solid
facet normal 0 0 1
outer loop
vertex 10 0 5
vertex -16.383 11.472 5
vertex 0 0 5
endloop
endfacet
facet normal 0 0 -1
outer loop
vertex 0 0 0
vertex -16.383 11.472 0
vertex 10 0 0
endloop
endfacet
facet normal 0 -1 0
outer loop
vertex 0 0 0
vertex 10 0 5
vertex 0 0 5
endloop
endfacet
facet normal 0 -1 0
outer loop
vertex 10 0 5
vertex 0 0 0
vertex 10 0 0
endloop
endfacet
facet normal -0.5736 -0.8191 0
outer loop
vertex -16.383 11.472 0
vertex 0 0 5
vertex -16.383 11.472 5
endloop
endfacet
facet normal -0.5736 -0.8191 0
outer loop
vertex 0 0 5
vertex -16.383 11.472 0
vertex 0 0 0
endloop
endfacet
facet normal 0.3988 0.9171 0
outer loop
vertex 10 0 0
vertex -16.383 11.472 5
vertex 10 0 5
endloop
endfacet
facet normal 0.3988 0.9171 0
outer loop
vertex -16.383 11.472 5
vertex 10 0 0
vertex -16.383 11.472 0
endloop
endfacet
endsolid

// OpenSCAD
// Title: Wedge Triangle Module
// Author: Carlo Wood
// Date: 19/8/2016
// License: Creative Commons - Share Alike - Attribution

// Usage: Include in your other .scad projects and call wedge with arguments for the height
//        of the wedge, two of the legs of the wedge, and the angle between those legs.
//        The resulting wedge will be placed with the point at the origin, `leg1' along the x-axis
//        and extending `height' into the z axis, with the angle starting at the x axis and
//        extending counter-clockwise as per the right-hand rule towards `leg2`.


//           Y-axis
//           |
//           |  /\
//      leg2 --/  \
//           |/    \
//           /)_____\_______X-axis
//     angle--'  \__ leg1
//
module wedge(angle, leg1, leg2, height = 0.5)
{
  // Store the length of all three sides in an array.
  side = [sqrt(leg1 * leg1 + leg2 * leg2 - 2 * leg1 * leg2 * cos(angle)),	// Law of Cosines.
          leg1,
          leg2];

  i = (leg2 > leg1) ? 2 : 1;
  longest_leg = side[i];
  longest_side = (side[0] > longest_leg) ? side[0] : longest_leg;

  // The corner opposite of the shortest leg must be less than 90 degrees.
  sa = asin(side[3 - i] * sin(angle) / side[0]);		// Law of Sines.
  sb = 180 - angle - sa;					// Sum of all angles is 180 degrees.

  // Store the size of all three angles in an array.
  a = [angle, (i == 1) ? sb : sa, (i == 1) ? sa : sb];

  // Is there anything to draw at all?
  if (angle > 0 && angle < 180)
  {
    intersection()
    {
      if (angle <= 90)
	intersection()
	{
	  cube([longest_leg, longest_leg, height]);
	  rotate([0, 0, angle - 90])
	    cube([longest_leg, longest_leg, height]);
	}
      else
	union()
	{
	  cube([longest_leg, longest_leg, height]);
	  rotate([0, 0, angle - 90])
	    cube([longest_leg, longest_leg, height]);
	}
      if (a[2] < 90)
      {
	translate([leg1, 0, 0])
	  rotate([0, 0, 90 - a[2]])
	    translate([-longest_side, 0, 0])
	      cube([longest_side, longest_side, height]);
      }
      else
      {
        rotate([0, 0, angle])
	  translate([leg2, 0, 0])
	    rotate([0, 0, a[1]])
	      translate([-longest_side, 0, 0])
	        cube([longest_side, longest_side, height]);
      }
    }
  }
}

// Example: wedge(145, 10, 20, 5); // Would create a triangle with thickness 5 where two legs,
                                   // being 10 and 20 respectively, making an angle of 145 degrees,
				   // the point on the z-axis and leg1 along the x-axis.

wedge(145, 10, 20, 5);
